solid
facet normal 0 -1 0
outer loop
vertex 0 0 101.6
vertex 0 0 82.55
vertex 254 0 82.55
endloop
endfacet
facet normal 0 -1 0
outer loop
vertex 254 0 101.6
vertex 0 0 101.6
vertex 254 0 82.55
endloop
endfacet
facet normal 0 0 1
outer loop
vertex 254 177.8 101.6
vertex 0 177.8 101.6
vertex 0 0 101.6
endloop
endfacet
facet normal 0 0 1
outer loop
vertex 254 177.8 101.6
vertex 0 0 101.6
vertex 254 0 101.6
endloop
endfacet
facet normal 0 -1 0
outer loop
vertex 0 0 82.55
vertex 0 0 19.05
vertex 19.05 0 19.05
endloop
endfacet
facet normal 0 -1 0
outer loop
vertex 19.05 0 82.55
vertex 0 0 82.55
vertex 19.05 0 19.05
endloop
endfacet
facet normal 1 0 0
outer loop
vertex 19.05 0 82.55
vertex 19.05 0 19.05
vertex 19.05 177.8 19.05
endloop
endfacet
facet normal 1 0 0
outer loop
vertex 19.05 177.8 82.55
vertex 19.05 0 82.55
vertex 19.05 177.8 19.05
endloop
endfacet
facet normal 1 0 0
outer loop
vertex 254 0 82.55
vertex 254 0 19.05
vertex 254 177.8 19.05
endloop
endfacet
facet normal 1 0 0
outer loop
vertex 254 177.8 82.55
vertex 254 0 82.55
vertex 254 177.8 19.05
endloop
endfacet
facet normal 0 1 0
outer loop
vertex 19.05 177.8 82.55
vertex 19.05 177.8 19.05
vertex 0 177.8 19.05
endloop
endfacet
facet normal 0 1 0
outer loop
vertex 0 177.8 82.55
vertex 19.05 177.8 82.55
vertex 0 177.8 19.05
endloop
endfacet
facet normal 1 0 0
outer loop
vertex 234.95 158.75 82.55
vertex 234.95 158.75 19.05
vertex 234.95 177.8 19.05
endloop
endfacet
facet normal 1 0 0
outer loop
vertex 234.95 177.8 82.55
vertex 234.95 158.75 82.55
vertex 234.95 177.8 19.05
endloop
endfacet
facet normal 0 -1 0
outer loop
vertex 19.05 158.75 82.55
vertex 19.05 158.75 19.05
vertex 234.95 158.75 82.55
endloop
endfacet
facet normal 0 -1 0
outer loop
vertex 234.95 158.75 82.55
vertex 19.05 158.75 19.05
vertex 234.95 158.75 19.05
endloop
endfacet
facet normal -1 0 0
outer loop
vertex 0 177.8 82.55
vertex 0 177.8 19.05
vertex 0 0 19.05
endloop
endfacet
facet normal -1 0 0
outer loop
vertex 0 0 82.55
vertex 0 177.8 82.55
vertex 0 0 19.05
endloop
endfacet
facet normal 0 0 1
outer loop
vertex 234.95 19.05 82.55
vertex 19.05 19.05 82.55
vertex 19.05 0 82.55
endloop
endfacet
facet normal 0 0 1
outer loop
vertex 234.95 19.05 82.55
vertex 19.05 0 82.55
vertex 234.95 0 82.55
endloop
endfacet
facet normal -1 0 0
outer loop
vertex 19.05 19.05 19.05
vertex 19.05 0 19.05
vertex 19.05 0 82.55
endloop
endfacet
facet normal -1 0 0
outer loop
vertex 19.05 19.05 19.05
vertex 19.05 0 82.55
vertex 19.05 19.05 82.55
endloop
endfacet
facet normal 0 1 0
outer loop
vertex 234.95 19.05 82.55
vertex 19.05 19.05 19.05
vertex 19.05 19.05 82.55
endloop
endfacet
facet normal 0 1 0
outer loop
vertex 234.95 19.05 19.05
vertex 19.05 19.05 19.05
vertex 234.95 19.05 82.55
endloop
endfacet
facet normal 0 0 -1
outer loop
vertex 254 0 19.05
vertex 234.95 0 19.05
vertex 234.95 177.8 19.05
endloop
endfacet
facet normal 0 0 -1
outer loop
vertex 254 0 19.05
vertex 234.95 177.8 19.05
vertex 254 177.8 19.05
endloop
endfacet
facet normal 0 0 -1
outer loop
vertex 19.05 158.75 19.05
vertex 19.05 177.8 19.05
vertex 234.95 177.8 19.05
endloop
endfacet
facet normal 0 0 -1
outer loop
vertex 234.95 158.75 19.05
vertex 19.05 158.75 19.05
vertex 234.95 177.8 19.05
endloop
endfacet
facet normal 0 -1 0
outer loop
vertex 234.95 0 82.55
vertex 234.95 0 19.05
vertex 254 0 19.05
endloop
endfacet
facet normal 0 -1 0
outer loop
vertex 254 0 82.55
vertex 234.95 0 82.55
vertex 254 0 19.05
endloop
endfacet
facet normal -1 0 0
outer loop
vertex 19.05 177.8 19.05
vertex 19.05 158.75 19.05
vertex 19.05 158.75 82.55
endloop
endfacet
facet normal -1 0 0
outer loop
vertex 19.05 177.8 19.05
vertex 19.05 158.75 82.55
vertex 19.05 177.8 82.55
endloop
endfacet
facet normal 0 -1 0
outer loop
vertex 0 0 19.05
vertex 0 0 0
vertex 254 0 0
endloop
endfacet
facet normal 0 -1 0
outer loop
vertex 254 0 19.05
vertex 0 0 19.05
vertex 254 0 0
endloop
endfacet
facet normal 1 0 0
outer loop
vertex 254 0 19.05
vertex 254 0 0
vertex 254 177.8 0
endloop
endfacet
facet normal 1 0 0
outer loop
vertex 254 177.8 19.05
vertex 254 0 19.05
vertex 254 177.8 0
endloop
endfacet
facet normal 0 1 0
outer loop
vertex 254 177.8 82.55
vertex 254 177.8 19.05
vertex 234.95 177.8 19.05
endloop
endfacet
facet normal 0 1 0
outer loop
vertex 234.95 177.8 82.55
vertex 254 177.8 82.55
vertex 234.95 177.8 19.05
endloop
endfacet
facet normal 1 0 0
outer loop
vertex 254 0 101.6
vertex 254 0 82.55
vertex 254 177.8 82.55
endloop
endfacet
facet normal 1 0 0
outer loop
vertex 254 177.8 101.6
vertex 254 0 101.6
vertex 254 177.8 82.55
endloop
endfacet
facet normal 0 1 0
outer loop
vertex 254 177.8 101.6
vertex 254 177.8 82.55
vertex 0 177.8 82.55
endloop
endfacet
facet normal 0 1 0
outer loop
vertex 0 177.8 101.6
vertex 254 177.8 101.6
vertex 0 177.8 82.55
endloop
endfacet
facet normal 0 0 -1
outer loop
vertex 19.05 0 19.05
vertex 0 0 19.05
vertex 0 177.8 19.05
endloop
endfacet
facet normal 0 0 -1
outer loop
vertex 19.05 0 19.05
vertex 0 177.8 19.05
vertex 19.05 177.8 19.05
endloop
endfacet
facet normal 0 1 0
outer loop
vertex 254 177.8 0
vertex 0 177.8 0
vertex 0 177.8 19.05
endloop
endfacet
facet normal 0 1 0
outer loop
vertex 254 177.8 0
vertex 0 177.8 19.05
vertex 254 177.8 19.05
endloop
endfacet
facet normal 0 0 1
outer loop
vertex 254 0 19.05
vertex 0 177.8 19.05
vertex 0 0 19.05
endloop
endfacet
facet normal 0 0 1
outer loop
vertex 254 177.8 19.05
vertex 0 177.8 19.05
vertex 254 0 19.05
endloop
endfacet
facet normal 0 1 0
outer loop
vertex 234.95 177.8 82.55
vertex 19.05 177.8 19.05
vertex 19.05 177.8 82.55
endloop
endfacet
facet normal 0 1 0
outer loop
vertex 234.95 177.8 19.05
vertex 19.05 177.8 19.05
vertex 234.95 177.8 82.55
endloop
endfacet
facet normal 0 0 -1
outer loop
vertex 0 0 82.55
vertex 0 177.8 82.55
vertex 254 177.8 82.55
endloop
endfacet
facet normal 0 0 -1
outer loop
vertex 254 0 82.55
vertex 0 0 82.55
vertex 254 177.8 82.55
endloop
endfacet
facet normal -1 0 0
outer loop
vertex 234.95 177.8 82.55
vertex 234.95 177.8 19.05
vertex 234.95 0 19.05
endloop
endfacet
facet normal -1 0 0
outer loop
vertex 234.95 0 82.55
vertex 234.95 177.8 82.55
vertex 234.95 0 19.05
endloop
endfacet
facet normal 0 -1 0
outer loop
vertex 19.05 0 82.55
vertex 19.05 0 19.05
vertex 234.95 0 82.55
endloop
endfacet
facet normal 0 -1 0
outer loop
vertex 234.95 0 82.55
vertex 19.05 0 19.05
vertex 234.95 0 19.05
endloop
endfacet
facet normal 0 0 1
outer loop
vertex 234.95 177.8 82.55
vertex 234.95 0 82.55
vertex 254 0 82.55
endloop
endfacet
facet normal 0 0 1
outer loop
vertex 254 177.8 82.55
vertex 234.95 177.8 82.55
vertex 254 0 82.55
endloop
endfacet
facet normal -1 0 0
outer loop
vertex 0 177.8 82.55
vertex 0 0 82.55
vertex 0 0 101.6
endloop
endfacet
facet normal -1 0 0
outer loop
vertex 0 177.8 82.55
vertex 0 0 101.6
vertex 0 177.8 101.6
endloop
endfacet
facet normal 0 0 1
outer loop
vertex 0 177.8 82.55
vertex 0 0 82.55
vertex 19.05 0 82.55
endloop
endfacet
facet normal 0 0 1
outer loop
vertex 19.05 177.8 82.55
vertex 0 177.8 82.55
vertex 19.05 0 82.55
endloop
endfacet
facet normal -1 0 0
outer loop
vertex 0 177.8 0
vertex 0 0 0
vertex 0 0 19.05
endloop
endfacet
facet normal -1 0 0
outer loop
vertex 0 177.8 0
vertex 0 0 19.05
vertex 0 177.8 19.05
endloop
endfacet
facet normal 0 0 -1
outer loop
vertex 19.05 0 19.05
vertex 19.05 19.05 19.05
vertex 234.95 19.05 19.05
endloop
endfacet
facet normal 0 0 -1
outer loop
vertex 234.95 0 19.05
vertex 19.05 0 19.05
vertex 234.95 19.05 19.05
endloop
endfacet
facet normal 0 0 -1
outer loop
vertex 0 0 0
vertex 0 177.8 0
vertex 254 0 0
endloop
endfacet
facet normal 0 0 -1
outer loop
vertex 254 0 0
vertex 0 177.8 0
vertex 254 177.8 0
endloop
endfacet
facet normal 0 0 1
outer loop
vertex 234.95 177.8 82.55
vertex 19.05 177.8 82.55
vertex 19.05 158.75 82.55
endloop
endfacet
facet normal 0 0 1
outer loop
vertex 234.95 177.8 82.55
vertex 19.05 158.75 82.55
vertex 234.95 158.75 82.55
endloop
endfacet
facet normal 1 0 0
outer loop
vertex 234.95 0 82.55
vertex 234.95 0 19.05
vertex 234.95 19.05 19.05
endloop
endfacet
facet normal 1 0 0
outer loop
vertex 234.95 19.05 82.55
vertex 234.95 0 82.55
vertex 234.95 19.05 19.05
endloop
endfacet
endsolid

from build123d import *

# Parameters (mm, degrees)
F0_W     = 254
F0_H     = 177.8
F1_DEPTH = 19.05
F3_DEPTH = 63.5
F2_W     = 215.9
F2_H     = 19.05
F4_DEPTH = 63.5
F5_W     = 19.05
F5_H     = 177.8
F6_DEPTH = 19.05


with BuildPart() as f1:
    # F0 (on Top) → F1 (new body)
    with BuildSketch(Plane.XY):
        with Locations((127, 88.9)):
            Rectangle(F0_W, F0_H)
    extrude(amount=F1_DEPTH)


with BuildPart() as f3:
    # F2 (on face) → F3 (new body)
    with BuildSketch(Plane.XY.offset(19.05)):
        Polygon((19.05, 177.8), (0, 177.8), (0, 0), (19.05, 0), (19.05, 19.05), (19.05, 158.75), align=None)
        Polygon((254, 177.8), (234.95, 177.8), (234.95, 158.75), (234.95, 19.05), (234.95, 0), (254, 0), align=None)
    extrude(amount=F3_DEPTH)


with BuildPart() as f4:
    # F2 (on face) → F4 (new body)
    with BuildSketch(Plane.XY.offset(19.05)):
        with Locations((127, 9.525)):
            Rectangle(F2_W, F2_H)
        with Locations((127, 168.275)):
            Rectangle(F2_W, F2_H)
    extrude(amount=F4_DEPTH)


with BuildPart() as f6:
    # F5 (on face) → F6 (new body)
    with BuildSketch(Plane.XY.offset(82.55)):
        with Locations((9.525, 88.9)):
            Rectangle(F5_W, F5_H)
        Polygon((19.05, 177.8), (19.05, 0), (234.95, 0), (254, 0), (254, 177.8), (234.95, 177.8), align=None)
    extrude(amount=F6_DEPTH)


solid = Compound([f1.part, f3.part, f4.part, f6.part])
